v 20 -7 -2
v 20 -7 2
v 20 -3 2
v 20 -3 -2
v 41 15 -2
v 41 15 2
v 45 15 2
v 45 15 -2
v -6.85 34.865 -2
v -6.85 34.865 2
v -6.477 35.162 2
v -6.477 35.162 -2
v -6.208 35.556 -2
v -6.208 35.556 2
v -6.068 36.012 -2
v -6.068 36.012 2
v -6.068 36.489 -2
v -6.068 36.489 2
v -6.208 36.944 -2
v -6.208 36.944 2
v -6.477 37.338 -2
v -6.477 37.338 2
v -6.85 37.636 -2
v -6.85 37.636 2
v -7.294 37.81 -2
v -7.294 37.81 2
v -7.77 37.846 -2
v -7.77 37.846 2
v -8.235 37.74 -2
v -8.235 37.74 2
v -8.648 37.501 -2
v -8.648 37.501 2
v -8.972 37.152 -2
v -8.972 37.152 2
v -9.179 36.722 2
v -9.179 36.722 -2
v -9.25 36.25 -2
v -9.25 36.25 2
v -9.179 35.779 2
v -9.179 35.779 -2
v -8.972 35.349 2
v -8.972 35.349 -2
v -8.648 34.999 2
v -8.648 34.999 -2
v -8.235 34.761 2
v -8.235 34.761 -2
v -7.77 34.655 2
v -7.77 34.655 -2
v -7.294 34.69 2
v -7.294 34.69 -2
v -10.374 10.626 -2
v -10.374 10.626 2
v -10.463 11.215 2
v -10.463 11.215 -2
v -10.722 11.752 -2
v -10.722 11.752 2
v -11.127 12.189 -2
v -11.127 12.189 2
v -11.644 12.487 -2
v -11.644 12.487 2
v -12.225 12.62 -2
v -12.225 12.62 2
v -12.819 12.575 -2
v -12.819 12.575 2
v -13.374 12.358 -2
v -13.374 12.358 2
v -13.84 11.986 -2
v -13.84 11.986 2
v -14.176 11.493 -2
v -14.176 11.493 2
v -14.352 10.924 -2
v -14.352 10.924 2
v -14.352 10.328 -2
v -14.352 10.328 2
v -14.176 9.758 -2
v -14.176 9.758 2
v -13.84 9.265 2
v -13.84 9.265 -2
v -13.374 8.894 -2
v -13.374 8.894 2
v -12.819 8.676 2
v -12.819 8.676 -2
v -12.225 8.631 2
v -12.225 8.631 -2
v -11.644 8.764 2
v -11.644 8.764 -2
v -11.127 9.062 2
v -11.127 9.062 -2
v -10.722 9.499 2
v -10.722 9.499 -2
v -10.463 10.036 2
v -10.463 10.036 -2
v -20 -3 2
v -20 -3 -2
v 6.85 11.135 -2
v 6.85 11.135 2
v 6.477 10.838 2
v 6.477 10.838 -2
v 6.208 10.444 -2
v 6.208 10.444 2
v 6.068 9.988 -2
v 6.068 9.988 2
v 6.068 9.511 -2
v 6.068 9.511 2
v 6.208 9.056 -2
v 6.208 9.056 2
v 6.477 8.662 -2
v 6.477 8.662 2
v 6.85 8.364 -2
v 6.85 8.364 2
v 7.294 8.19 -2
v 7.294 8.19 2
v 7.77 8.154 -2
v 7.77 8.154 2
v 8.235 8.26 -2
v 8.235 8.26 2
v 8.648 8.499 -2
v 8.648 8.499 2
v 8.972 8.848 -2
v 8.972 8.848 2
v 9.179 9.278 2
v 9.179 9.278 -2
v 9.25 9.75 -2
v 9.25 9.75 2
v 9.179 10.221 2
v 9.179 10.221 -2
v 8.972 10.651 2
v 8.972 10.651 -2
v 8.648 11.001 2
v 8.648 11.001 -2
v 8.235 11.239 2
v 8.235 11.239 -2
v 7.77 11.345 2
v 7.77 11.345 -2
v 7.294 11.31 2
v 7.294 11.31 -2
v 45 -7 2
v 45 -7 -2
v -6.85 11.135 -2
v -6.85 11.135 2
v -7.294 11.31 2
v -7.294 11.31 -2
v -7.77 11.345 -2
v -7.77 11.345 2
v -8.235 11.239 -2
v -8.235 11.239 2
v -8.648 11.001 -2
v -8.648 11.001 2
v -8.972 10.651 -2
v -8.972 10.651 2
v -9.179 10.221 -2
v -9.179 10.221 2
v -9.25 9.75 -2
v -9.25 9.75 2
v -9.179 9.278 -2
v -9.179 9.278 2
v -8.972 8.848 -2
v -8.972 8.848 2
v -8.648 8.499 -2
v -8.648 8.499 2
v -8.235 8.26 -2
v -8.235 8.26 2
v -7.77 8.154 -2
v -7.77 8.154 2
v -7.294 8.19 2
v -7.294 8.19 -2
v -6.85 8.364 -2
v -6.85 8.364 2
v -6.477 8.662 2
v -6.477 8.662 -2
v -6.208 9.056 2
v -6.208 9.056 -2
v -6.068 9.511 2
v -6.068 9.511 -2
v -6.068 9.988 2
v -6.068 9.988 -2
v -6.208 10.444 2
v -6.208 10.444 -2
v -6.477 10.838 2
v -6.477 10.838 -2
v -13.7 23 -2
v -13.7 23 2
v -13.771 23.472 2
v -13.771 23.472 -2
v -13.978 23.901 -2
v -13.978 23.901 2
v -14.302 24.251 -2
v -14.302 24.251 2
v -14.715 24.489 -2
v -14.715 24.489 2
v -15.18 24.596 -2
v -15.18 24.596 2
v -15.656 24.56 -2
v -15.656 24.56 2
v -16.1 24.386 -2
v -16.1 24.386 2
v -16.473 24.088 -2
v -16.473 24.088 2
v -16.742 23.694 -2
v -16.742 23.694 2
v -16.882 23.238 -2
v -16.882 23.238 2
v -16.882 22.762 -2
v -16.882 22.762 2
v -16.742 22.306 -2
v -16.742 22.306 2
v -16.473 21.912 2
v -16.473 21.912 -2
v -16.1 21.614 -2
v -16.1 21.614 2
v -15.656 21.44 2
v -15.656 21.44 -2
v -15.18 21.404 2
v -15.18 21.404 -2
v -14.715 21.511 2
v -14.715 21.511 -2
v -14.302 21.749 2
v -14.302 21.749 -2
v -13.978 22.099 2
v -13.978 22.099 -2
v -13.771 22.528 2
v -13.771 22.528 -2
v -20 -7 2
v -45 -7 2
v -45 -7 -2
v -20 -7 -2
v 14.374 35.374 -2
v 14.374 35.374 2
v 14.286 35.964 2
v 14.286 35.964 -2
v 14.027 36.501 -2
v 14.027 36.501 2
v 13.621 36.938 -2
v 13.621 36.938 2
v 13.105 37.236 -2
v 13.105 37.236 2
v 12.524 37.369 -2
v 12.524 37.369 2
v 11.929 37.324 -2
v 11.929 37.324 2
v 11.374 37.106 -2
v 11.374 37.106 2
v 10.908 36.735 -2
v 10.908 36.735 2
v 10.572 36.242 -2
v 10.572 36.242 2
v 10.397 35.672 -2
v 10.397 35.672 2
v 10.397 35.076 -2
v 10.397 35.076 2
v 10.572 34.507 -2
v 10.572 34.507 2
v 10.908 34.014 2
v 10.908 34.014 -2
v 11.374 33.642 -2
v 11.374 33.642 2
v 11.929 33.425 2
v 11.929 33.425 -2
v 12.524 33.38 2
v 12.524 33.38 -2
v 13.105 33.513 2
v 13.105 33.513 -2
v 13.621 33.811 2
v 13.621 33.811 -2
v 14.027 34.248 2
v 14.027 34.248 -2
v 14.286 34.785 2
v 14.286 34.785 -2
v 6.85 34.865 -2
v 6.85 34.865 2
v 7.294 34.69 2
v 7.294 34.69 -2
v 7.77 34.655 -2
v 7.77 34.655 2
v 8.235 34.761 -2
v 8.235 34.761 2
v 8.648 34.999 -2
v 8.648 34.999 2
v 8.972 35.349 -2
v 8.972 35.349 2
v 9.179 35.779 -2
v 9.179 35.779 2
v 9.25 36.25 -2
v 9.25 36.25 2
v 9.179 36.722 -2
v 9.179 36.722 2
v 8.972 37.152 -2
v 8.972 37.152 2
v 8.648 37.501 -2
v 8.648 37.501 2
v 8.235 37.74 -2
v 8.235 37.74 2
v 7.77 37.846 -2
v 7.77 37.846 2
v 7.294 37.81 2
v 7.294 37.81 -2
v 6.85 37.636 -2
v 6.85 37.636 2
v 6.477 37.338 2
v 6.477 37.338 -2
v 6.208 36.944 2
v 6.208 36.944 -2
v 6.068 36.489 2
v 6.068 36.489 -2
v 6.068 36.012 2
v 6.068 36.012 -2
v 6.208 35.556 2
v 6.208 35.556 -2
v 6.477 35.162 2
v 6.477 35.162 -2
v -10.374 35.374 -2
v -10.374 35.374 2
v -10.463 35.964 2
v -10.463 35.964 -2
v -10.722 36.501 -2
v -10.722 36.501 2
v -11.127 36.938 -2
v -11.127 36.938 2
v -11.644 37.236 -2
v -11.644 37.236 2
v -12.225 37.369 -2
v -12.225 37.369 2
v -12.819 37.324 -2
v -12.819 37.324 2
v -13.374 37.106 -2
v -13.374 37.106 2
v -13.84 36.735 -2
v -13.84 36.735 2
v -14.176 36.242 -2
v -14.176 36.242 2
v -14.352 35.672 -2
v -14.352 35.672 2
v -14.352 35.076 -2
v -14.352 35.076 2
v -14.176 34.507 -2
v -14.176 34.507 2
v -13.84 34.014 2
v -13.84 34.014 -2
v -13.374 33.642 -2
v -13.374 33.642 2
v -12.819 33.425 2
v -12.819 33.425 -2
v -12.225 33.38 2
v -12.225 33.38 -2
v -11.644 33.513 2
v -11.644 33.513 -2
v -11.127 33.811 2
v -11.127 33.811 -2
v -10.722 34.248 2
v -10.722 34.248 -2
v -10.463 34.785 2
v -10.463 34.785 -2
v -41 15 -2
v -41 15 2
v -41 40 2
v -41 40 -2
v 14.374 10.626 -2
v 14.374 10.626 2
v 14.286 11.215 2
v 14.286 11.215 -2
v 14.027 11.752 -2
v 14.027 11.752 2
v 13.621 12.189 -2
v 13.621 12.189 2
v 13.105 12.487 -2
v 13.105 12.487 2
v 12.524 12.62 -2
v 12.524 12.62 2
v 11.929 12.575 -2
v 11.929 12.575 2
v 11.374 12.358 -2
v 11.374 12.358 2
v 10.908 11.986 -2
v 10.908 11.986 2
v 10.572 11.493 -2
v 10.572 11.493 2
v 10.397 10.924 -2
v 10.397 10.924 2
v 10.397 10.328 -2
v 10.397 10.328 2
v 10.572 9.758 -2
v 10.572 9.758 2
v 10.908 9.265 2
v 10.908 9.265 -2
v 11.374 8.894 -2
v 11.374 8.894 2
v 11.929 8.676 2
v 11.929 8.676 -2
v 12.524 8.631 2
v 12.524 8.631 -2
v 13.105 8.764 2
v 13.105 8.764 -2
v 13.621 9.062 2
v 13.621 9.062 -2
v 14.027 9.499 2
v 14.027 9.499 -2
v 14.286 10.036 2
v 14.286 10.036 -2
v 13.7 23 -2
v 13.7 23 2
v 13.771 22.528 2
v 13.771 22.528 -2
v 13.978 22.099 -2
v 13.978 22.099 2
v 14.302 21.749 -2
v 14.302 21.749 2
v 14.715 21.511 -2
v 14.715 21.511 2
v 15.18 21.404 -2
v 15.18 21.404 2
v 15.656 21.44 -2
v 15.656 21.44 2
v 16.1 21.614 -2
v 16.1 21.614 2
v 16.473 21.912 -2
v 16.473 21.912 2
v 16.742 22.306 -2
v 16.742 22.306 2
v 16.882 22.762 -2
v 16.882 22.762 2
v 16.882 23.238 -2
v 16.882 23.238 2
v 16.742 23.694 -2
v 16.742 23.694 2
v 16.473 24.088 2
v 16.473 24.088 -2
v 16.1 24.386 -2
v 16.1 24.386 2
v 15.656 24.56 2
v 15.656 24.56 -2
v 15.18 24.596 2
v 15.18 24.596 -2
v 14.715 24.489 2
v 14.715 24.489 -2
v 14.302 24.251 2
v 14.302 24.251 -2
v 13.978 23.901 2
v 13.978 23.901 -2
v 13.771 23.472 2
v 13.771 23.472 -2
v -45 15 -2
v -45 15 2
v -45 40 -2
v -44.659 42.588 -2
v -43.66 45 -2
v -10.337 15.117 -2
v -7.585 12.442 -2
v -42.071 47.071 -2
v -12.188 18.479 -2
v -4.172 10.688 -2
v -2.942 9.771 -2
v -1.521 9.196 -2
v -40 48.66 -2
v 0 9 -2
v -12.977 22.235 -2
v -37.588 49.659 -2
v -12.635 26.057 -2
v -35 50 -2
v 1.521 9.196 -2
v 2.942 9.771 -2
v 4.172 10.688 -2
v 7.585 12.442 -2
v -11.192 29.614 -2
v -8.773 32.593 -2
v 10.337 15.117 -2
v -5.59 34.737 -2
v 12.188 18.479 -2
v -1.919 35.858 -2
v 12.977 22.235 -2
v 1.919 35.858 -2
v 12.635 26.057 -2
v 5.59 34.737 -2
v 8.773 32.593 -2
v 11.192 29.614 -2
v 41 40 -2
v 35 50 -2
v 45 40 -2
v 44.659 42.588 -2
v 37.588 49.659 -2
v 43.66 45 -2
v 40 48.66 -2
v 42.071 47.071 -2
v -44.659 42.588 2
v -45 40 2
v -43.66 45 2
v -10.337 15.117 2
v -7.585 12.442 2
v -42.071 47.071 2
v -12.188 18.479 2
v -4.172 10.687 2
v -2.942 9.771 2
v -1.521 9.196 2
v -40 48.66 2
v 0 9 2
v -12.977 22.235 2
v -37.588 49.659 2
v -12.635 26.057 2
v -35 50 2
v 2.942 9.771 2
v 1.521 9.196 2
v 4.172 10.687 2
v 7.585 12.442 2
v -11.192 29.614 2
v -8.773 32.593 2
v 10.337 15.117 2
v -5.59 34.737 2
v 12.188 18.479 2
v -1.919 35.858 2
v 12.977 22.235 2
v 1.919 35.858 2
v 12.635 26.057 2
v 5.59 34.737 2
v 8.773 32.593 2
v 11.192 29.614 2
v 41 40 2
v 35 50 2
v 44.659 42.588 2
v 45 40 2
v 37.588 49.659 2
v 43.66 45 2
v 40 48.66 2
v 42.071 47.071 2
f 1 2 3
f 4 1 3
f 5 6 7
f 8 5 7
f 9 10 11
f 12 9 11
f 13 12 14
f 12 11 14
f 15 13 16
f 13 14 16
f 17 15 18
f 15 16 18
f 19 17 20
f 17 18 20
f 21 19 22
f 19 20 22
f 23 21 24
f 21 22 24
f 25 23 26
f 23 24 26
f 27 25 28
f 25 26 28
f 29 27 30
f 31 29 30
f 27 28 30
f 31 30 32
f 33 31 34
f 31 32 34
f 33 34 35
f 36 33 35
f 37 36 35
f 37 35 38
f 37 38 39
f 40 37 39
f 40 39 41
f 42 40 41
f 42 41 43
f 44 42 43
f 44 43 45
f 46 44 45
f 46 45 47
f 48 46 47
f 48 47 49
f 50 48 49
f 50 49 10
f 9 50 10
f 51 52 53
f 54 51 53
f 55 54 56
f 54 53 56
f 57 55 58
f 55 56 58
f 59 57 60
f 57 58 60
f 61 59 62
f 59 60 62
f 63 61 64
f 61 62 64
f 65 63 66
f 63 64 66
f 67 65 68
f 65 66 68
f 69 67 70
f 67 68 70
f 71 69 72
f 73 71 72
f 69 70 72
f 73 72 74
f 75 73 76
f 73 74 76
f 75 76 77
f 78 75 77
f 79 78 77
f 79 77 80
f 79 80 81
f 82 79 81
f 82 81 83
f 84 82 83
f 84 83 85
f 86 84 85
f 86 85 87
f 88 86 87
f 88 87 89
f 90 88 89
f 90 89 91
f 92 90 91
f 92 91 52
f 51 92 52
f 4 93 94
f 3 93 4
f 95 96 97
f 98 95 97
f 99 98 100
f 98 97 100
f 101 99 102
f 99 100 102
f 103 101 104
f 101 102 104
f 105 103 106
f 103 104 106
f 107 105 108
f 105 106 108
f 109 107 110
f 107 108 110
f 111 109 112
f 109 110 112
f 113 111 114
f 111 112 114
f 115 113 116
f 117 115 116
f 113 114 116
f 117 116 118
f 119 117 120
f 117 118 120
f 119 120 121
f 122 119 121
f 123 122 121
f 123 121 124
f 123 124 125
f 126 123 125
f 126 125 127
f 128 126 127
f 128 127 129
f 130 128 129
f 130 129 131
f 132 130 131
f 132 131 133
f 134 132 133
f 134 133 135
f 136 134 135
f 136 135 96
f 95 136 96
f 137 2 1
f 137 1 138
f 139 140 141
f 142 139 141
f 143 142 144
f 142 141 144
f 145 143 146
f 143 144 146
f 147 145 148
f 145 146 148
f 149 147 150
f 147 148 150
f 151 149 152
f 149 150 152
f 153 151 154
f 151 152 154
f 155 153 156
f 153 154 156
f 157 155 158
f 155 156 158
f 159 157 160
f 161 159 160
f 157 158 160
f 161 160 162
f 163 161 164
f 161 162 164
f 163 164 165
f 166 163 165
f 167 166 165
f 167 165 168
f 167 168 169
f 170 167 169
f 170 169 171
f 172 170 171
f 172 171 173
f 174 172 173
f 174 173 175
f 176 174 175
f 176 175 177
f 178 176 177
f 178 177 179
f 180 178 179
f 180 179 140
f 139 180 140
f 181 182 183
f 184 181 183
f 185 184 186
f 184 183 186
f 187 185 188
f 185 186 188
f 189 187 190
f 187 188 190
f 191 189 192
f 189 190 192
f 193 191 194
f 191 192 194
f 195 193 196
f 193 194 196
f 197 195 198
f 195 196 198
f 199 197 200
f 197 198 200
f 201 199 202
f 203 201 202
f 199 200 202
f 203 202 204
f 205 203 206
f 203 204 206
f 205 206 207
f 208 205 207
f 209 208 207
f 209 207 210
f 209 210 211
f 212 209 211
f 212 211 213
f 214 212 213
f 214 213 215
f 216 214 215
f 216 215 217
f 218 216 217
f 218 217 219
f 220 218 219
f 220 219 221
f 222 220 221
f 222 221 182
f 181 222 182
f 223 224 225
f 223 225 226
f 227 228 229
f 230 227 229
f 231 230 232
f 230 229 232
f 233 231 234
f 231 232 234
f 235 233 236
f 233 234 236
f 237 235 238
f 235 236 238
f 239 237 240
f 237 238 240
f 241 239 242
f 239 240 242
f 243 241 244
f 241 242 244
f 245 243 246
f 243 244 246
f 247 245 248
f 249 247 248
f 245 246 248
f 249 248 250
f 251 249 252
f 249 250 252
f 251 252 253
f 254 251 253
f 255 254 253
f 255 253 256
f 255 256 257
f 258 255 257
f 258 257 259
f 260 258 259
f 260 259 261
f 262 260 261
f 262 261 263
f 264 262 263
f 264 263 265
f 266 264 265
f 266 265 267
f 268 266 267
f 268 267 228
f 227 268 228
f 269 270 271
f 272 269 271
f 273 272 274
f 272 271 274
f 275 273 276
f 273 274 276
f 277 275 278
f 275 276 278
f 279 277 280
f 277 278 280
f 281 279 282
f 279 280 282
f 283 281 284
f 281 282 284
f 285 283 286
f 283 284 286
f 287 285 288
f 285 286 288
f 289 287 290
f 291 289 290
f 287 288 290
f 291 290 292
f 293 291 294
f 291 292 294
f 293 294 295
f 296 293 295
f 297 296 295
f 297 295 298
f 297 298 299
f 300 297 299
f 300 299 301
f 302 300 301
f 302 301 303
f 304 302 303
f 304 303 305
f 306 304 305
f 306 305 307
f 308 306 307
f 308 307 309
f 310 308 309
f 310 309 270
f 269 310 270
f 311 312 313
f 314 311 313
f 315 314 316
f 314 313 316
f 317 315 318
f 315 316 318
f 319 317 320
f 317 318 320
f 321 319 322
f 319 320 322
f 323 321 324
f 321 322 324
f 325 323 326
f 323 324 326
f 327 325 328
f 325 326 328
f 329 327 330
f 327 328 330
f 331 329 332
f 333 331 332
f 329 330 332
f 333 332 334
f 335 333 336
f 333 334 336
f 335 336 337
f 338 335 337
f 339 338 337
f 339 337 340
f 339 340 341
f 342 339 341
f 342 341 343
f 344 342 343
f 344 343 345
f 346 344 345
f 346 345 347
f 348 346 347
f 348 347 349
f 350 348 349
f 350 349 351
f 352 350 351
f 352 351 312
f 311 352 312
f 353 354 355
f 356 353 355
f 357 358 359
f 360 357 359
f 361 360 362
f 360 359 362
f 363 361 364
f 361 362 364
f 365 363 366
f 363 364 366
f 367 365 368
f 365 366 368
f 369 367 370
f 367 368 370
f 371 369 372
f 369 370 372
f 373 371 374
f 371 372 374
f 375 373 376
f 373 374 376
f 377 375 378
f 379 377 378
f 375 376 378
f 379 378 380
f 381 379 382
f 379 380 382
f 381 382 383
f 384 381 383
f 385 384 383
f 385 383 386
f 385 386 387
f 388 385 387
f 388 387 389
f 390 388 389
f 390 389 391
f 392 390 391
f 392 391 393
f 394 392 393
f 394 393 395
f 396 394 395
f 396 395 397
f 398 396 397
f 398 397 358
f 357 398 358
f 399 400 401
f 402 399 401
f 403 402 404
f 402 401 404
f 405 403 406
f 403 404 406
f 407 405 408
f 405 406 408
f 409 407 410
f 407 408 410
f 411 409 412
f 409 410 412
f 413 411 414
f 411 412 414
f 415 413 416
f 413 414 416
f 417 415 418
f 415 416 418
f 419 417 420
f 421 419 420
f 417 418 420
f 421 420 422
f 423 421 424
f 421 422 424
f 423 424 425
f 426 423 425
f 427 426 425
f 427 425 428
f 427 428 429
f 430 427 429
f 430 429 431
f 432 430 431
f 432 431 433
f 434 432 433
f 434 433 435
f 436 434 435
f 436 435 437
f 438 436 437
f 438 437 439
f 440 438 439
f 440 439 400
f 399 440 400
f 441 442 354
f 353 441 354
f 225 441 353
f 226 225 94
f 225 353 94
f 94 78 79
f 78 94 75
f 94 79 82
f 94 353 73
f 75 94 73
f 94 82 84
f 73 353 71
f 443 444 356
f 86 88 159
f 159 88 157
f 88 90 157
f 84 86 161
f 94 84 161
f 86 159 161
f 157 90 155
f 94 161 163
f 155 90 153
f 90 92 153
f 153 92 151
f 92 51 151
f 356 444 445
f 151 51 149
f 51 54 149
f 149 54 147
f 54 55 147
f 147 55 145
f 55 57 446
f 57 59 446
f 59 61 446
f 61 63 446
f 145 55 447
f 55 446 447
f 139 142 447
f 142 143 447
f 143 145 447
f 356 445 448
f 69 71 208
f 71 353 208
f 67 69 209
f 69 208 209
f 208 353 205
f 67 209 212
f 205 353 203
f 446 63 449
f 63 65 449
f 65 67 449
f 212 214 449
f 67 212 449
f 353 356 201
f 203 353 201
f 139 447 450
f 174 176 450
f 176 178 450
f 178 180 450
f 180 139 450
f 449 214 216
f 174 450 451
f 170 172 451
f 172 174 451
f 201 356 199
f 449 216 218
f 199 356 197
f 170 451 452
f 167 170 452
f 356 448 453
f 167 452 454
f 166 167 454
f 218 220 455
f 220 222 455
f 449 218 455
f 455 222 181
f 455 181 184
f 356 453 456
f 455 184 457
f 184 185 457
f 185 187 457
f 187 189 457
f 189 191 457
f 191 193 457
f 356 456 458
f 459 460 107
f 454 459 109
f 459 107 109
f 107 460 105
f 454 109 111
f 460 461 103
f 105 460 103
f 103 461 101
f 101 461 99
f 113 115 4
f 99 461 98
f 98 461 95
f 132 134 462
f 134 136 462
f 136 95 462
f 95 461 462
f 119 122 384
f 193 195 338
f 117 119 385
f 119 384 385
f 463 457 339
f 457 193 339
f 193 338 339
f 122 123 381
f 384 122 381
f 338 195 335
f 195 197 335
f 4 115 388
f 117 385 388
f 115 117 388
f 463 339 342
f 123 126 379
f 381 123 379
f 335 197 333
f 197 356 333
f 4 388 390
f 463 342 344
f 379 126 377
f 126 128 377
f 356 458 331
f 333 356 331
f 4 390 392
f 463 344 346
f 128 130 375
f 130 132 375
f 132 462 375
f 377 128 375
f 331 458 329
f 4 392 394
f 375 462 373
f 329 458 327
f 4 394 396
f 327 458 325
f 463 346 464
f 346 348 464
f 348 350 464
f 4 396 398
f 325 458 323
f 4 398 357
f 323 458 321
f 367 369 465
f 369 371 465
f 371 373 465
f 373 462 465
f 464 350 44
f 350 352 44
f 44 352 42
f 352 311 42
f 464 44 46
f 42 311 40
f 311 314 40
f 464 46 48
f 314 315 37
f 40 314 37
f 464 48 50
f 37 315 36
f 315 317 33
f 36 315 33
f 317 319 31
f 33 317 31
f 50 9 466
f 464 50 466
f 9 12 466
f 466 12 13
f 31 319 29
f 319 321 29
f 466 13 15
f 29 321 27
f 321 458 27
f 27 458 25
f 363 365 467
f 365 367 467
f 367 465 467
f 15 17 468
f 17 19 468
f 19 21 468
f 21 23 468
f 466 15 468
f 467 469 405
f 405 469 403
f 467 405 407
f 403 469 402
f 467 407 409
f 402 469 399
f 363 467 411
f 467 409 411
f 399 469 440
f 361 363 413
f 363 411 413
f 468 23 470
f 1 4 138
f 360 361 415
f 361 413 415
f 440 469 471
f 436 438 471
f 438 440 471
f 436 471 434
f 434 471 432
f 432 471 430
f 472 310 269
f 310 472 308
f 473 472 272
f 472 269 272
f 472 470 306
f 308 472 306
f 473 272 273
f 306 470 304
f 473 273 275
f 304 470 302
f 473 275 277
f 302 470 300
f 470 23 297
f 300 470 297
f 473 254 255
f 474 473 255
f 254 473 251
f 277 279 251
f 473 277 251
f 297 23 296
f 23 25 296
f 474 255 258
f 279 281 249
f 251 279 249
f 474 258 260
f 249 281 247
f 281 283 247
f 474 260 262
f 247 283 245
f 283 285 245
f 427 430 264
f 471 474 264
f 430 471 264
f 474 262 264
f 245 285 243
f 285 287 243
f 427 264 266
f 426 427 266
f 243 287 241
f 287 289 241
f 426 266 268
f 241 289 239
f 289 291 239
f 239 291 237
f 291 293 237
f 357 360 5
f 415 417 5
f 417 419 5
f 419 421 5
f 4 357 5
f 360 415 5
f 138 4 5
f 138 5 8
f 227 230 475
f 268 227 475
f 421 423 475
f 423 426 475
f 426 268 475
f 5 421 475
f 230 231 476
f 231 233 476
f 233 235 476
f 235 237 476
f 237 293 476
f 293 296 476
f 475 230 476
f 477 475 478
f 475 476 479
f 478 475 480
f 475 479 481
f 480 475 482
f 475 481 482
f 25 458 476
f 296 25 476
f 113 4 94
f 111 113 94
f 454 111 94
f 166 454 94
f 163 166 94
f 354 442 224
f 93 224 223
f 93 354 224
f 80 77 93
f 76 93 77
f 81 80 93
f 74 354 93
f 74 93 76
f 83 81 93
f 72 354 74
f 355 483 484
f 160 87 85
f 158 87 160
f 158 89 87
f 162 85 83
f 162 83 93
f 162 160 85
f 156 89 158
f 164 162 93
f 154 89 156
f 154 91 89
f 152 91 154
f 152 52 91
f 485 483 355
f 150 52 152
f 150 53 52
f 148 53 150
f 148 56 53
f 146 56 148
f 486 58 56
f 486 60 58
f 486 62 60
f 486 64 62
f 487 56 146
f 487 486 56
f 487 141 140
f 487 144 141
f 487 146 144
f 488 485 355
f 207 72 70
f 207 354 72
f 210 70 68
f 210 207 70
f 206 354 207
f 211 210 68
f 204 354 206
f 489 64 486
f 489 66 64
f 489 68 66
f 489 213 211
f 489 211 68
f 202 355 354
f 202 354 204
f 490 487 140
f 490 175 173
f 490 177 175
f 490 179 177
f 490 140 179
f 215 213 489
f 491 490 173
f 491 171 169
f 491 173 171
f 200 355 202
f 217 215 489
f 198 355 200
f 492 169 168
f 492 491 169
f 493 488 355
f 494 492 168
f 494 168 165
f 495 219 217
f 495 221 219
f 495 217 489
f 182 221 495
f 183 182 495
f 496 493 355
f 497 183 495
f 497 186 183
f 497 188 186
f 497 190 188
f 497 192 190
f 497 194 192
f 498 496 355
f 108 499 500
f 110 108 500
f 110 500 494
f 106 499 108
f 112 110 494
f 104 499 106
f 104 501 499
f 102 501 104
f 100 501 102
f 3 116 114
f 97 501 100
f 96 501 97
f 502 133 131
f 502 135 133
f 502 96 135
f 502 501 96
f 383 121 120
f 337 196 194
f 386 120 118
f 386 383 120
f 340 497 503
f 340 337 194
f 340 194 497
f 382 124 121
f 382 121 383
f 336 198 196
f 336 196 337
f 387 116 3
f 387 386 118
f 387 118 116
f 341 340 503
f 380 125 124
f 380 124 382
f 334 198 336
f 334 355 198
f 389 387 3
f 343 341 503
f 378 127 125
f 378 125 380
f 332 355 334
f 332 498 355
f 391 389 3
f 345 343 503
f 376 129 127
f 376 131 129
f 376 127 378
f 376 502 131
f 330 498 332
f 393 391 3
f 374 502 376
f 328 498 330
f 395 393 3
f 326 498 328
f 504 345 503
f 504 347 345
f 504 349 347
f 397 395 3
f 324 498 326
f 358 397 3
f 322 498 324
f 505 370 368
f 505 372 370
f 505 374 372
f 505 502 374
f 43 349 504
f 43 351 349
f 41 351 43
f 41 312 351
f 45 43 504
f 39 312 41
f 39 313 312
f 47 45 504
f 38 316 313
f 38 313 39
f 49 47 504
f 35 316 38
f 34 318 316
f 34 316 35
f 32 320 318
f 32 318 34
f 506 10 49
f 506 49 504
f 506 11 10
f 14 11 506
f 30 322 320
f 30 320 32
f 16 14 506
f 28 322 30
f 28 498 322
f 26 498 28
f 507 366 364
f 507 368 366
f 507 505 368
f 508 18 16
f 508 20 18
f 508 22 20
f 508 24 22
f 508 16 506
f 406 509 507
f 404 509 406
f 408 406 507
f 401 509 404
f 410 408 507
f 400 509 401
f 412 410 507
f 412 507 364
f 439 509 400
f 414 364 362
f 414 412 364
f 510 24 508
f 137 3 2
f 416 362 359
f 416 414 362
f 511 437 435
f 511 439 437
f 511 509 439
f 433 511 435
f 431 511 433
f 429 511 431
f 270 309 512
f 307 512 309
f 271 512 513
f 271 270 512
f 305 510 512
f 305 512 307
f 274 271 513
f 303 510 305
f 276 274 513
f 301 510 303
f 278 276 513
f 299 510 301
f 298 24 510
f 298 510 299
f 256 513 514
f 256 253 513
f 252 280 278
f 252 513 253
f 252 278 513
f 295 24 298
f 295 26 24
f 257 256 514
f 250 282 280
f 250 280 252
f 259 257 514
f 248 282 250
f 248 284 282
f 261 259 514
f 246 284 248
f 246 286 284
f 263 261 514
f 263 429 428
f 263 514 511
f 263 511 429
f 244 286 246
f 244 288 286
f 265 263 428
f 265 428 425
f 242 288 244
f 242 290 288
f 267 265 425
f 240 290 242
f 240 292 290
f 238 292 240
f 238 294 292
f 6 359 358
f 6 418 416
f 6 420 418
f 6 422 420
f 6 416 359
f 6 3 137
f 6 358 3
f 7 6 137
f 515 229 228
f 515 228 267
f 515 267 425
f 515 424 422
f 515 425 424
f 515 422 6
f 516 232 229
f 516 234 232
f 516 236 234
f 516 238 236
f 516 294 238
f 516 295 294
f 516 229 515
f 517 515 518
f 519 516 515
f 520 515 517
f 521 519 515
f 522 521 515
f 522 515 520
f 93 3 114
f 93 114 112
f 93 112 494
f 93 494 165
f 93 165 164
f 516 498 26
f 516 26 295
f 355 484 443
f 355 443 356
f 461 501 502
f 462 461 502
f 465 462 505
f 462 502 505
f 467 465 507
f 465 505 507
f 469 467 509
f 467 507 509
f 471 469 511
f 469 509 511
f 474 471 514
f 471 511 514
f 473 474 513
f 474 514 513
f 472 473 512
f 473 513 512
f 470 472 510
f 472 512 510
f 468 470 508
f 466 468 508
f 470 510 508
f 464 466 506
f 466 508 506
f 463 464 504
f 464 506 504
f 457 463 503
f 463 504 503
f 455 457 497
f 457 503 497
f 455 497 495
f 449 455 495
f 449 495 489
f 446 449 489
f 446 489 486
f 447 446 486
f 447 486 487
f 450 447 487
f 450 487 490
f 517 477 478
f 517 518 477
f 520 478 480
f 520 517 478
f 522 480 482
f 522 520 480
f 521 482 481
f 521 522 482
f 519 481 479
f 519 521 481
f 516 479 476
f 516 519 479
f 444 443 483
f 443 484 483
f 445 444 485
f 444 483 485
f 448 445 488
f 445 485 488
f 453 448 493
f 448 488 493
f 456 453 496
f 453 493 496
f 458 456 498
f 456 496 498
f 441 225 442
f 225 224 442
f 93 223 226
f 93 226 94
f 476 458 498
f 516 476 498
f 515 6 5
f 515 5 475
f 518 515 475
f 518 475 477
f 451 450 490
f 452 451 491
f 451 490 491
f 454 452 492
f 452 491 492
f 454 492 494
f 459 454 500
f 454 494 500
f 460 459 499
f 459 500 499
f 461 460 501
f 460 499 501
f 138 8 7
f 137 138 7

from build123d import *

# Parameters (mm, degrees)
SKETCH1_W           = 50
SKETCH1_H           = 4
BOSS_EXTRUDE1_DEPTH = 50
SKETCH2_R           = 13
CUT_EXTRUDE1_DEPTH  = 50
SKETCH4_R           = 2
CUT_EXTRUDE3_DEPTH  = 50
SKETCH7_W           = 4
SKETCH7_H           = 50
BOSS_EXTRUDE3_DEPTH = 20
SKETCH8_W           = 90
SKETCH8_H           = 4
BOSS_EXTRUDE4_DEPTH = 3
SKETCH9_W           = 25
SKETCH9_H           = 4
BOSS_EXTRUDE5_DEPTH = 4
FILLET1_R           = 10
SKETCH10_R          = 1.6
CUT_EXTRUDE4_DEPTH  = 20
CIRPATTERN1_COUNT   = 6
SKETCH11_R          = 6
CUT_EXTRUDE5_DEPTH  = 20
SKETCH12_W          = 4
SKETCH12_H          = 25
CUT_EXTRUDE6_DEPTH  = 20


with BuildPart() as part:
    # Sketch1 → Boss-Extrude1 (new body)
    with BuildSketch(Plane(origin=(0, 0, 0), x_dir=(1, 0, 0), z_dir=(0, 1, 0))):
        Rectangle(SKETCH1_W, SKETCH1_H)
    extrude(amount=BOSS_EXTRUDE1_DEPTH)

    # Sketch2 → Cut-Extrude1 (cut)
    with BuildSketch(Plane.XY.offset(2)):
        with Locations((0, 23)):
            Circle(SKETCH2_R)
    extrude(amount=-CUT_EXTRUDE1_DEPTH, mode=Mode.SUBTRACT)

    # Sketch4 → Cut-Extrude3 (cut)
    with BuildSketch(Plane.XY.offset(2)):
        with Locations((12.374368671, 35.374368671)):
            Circle(SKETCH4_R)
        with Locations((12.374368671, 10.625631329)):
            Circle(SKETCH4_R)
        with Locations((-12.374368671, 35.374368671)):
            Circle(SKETCH4_R)
        with Locations((-12.374368671, 10.625631329)):
            Circle(SKETCH4_R)
    extrude(amount=-CUT_EXTRUDE3_DEPTH, mode=Mode.SUBTRACT)

    # Sketch7 → Boss-Extrude3 (add)
    with BuildSketch(Plane.ZY.offset(25)):
        with Locations((0, 25)):
            Rectangle(SKETCH7_W, SKETCH7_H)
    boss_extrude3 = extrude(amount=BOSS_EXTRUDE3_DEPTH)

    # Mirror1: Boss-Extrude3 across plane
    add(boss_extrude3.mirror(Plane(origin=(0, 0, 0), x_dir=(0, 0, 1), z_dir=(1, 0, 0))))

    # Sketch8 → Boss-Extrude4 (add)
    with BuildSketch(Plane.XZ):
        Rectangle(SKETCH8_W, SKETCH8_H)
    extrude(amount=BOSS_EXTRUDE4_DEPTH)

    # Sketch9 → Boss-Extrude5 (add)
    with BuildSketch(Plane.XY.offset(2)):
        with Locations((-32.5, -5)):
            Rectangle(SKETCH9_W, SKETCH9_H)
        with Locations((32.5, -5)):
            Rectangle(SKETCH9_W, SKETCH9_H)
    extrude(amount=-BOSS_EXTRUDE5_DEPTH)

    # Fillet1
    fillet1_edges = [part.edges().sort_by_distance(p)[0] for p in [
        (-45, 50, 0),
        (45, 50, 0),
    ]]
    fillet(fillet1_edges, radius=FILLET1_R)

    # Sketch10 → Cut-Extrude4 (cut)
    with BuildSketch(Plane.XY.offset(2)):
        with Locations((-15.3, 23)):
            Circle(SKETCH10_R)
    cut_extrude4 = extrude(amount=-CUT_EXTRUDE4_DEPTH, mode=Mode.SUBTRACT)

    # CirPattern1: Cut-Extrude4 ×6 about axis
    cirpattern1_axis = Axis((0, 23, 0), (0, 0, 1))
    for i in range(1, CIRPATTERN1_COUNT):
        add(cut_extrude4.rotate(cirpattern1_axis, i * 360 / CIRPATTERN1_COUNT), mode=Mode.SUBTRACT)

    # Sketch11 → Cut-Extrude5 (cut)
    with BuildSketch(Plane.XY.offset(2)):
        with Locations((0, 15)):
            Circle(SKETCH11_R)
    extrude(amount=-CUT_EXTRUDE5_DEPTH, mode=Mode.SUBTRACT)

    # Sketch12 → Cut-Extrude6 (cut)
    with BuildSketch(Plane.XY.offset(2)):
        with Locations((43, 27.5)):
            Rectangle(SKETCH12_W, SKETCH12_H)
        with Locations((-43, 27.5)):
            Rectangle(SKETCH12_W, SKETCH12_H)
    extrude(amount=-CUT_EXTRUDE6_DEPTH, mode=Mode.SUBTRACT)


solid = part.part
